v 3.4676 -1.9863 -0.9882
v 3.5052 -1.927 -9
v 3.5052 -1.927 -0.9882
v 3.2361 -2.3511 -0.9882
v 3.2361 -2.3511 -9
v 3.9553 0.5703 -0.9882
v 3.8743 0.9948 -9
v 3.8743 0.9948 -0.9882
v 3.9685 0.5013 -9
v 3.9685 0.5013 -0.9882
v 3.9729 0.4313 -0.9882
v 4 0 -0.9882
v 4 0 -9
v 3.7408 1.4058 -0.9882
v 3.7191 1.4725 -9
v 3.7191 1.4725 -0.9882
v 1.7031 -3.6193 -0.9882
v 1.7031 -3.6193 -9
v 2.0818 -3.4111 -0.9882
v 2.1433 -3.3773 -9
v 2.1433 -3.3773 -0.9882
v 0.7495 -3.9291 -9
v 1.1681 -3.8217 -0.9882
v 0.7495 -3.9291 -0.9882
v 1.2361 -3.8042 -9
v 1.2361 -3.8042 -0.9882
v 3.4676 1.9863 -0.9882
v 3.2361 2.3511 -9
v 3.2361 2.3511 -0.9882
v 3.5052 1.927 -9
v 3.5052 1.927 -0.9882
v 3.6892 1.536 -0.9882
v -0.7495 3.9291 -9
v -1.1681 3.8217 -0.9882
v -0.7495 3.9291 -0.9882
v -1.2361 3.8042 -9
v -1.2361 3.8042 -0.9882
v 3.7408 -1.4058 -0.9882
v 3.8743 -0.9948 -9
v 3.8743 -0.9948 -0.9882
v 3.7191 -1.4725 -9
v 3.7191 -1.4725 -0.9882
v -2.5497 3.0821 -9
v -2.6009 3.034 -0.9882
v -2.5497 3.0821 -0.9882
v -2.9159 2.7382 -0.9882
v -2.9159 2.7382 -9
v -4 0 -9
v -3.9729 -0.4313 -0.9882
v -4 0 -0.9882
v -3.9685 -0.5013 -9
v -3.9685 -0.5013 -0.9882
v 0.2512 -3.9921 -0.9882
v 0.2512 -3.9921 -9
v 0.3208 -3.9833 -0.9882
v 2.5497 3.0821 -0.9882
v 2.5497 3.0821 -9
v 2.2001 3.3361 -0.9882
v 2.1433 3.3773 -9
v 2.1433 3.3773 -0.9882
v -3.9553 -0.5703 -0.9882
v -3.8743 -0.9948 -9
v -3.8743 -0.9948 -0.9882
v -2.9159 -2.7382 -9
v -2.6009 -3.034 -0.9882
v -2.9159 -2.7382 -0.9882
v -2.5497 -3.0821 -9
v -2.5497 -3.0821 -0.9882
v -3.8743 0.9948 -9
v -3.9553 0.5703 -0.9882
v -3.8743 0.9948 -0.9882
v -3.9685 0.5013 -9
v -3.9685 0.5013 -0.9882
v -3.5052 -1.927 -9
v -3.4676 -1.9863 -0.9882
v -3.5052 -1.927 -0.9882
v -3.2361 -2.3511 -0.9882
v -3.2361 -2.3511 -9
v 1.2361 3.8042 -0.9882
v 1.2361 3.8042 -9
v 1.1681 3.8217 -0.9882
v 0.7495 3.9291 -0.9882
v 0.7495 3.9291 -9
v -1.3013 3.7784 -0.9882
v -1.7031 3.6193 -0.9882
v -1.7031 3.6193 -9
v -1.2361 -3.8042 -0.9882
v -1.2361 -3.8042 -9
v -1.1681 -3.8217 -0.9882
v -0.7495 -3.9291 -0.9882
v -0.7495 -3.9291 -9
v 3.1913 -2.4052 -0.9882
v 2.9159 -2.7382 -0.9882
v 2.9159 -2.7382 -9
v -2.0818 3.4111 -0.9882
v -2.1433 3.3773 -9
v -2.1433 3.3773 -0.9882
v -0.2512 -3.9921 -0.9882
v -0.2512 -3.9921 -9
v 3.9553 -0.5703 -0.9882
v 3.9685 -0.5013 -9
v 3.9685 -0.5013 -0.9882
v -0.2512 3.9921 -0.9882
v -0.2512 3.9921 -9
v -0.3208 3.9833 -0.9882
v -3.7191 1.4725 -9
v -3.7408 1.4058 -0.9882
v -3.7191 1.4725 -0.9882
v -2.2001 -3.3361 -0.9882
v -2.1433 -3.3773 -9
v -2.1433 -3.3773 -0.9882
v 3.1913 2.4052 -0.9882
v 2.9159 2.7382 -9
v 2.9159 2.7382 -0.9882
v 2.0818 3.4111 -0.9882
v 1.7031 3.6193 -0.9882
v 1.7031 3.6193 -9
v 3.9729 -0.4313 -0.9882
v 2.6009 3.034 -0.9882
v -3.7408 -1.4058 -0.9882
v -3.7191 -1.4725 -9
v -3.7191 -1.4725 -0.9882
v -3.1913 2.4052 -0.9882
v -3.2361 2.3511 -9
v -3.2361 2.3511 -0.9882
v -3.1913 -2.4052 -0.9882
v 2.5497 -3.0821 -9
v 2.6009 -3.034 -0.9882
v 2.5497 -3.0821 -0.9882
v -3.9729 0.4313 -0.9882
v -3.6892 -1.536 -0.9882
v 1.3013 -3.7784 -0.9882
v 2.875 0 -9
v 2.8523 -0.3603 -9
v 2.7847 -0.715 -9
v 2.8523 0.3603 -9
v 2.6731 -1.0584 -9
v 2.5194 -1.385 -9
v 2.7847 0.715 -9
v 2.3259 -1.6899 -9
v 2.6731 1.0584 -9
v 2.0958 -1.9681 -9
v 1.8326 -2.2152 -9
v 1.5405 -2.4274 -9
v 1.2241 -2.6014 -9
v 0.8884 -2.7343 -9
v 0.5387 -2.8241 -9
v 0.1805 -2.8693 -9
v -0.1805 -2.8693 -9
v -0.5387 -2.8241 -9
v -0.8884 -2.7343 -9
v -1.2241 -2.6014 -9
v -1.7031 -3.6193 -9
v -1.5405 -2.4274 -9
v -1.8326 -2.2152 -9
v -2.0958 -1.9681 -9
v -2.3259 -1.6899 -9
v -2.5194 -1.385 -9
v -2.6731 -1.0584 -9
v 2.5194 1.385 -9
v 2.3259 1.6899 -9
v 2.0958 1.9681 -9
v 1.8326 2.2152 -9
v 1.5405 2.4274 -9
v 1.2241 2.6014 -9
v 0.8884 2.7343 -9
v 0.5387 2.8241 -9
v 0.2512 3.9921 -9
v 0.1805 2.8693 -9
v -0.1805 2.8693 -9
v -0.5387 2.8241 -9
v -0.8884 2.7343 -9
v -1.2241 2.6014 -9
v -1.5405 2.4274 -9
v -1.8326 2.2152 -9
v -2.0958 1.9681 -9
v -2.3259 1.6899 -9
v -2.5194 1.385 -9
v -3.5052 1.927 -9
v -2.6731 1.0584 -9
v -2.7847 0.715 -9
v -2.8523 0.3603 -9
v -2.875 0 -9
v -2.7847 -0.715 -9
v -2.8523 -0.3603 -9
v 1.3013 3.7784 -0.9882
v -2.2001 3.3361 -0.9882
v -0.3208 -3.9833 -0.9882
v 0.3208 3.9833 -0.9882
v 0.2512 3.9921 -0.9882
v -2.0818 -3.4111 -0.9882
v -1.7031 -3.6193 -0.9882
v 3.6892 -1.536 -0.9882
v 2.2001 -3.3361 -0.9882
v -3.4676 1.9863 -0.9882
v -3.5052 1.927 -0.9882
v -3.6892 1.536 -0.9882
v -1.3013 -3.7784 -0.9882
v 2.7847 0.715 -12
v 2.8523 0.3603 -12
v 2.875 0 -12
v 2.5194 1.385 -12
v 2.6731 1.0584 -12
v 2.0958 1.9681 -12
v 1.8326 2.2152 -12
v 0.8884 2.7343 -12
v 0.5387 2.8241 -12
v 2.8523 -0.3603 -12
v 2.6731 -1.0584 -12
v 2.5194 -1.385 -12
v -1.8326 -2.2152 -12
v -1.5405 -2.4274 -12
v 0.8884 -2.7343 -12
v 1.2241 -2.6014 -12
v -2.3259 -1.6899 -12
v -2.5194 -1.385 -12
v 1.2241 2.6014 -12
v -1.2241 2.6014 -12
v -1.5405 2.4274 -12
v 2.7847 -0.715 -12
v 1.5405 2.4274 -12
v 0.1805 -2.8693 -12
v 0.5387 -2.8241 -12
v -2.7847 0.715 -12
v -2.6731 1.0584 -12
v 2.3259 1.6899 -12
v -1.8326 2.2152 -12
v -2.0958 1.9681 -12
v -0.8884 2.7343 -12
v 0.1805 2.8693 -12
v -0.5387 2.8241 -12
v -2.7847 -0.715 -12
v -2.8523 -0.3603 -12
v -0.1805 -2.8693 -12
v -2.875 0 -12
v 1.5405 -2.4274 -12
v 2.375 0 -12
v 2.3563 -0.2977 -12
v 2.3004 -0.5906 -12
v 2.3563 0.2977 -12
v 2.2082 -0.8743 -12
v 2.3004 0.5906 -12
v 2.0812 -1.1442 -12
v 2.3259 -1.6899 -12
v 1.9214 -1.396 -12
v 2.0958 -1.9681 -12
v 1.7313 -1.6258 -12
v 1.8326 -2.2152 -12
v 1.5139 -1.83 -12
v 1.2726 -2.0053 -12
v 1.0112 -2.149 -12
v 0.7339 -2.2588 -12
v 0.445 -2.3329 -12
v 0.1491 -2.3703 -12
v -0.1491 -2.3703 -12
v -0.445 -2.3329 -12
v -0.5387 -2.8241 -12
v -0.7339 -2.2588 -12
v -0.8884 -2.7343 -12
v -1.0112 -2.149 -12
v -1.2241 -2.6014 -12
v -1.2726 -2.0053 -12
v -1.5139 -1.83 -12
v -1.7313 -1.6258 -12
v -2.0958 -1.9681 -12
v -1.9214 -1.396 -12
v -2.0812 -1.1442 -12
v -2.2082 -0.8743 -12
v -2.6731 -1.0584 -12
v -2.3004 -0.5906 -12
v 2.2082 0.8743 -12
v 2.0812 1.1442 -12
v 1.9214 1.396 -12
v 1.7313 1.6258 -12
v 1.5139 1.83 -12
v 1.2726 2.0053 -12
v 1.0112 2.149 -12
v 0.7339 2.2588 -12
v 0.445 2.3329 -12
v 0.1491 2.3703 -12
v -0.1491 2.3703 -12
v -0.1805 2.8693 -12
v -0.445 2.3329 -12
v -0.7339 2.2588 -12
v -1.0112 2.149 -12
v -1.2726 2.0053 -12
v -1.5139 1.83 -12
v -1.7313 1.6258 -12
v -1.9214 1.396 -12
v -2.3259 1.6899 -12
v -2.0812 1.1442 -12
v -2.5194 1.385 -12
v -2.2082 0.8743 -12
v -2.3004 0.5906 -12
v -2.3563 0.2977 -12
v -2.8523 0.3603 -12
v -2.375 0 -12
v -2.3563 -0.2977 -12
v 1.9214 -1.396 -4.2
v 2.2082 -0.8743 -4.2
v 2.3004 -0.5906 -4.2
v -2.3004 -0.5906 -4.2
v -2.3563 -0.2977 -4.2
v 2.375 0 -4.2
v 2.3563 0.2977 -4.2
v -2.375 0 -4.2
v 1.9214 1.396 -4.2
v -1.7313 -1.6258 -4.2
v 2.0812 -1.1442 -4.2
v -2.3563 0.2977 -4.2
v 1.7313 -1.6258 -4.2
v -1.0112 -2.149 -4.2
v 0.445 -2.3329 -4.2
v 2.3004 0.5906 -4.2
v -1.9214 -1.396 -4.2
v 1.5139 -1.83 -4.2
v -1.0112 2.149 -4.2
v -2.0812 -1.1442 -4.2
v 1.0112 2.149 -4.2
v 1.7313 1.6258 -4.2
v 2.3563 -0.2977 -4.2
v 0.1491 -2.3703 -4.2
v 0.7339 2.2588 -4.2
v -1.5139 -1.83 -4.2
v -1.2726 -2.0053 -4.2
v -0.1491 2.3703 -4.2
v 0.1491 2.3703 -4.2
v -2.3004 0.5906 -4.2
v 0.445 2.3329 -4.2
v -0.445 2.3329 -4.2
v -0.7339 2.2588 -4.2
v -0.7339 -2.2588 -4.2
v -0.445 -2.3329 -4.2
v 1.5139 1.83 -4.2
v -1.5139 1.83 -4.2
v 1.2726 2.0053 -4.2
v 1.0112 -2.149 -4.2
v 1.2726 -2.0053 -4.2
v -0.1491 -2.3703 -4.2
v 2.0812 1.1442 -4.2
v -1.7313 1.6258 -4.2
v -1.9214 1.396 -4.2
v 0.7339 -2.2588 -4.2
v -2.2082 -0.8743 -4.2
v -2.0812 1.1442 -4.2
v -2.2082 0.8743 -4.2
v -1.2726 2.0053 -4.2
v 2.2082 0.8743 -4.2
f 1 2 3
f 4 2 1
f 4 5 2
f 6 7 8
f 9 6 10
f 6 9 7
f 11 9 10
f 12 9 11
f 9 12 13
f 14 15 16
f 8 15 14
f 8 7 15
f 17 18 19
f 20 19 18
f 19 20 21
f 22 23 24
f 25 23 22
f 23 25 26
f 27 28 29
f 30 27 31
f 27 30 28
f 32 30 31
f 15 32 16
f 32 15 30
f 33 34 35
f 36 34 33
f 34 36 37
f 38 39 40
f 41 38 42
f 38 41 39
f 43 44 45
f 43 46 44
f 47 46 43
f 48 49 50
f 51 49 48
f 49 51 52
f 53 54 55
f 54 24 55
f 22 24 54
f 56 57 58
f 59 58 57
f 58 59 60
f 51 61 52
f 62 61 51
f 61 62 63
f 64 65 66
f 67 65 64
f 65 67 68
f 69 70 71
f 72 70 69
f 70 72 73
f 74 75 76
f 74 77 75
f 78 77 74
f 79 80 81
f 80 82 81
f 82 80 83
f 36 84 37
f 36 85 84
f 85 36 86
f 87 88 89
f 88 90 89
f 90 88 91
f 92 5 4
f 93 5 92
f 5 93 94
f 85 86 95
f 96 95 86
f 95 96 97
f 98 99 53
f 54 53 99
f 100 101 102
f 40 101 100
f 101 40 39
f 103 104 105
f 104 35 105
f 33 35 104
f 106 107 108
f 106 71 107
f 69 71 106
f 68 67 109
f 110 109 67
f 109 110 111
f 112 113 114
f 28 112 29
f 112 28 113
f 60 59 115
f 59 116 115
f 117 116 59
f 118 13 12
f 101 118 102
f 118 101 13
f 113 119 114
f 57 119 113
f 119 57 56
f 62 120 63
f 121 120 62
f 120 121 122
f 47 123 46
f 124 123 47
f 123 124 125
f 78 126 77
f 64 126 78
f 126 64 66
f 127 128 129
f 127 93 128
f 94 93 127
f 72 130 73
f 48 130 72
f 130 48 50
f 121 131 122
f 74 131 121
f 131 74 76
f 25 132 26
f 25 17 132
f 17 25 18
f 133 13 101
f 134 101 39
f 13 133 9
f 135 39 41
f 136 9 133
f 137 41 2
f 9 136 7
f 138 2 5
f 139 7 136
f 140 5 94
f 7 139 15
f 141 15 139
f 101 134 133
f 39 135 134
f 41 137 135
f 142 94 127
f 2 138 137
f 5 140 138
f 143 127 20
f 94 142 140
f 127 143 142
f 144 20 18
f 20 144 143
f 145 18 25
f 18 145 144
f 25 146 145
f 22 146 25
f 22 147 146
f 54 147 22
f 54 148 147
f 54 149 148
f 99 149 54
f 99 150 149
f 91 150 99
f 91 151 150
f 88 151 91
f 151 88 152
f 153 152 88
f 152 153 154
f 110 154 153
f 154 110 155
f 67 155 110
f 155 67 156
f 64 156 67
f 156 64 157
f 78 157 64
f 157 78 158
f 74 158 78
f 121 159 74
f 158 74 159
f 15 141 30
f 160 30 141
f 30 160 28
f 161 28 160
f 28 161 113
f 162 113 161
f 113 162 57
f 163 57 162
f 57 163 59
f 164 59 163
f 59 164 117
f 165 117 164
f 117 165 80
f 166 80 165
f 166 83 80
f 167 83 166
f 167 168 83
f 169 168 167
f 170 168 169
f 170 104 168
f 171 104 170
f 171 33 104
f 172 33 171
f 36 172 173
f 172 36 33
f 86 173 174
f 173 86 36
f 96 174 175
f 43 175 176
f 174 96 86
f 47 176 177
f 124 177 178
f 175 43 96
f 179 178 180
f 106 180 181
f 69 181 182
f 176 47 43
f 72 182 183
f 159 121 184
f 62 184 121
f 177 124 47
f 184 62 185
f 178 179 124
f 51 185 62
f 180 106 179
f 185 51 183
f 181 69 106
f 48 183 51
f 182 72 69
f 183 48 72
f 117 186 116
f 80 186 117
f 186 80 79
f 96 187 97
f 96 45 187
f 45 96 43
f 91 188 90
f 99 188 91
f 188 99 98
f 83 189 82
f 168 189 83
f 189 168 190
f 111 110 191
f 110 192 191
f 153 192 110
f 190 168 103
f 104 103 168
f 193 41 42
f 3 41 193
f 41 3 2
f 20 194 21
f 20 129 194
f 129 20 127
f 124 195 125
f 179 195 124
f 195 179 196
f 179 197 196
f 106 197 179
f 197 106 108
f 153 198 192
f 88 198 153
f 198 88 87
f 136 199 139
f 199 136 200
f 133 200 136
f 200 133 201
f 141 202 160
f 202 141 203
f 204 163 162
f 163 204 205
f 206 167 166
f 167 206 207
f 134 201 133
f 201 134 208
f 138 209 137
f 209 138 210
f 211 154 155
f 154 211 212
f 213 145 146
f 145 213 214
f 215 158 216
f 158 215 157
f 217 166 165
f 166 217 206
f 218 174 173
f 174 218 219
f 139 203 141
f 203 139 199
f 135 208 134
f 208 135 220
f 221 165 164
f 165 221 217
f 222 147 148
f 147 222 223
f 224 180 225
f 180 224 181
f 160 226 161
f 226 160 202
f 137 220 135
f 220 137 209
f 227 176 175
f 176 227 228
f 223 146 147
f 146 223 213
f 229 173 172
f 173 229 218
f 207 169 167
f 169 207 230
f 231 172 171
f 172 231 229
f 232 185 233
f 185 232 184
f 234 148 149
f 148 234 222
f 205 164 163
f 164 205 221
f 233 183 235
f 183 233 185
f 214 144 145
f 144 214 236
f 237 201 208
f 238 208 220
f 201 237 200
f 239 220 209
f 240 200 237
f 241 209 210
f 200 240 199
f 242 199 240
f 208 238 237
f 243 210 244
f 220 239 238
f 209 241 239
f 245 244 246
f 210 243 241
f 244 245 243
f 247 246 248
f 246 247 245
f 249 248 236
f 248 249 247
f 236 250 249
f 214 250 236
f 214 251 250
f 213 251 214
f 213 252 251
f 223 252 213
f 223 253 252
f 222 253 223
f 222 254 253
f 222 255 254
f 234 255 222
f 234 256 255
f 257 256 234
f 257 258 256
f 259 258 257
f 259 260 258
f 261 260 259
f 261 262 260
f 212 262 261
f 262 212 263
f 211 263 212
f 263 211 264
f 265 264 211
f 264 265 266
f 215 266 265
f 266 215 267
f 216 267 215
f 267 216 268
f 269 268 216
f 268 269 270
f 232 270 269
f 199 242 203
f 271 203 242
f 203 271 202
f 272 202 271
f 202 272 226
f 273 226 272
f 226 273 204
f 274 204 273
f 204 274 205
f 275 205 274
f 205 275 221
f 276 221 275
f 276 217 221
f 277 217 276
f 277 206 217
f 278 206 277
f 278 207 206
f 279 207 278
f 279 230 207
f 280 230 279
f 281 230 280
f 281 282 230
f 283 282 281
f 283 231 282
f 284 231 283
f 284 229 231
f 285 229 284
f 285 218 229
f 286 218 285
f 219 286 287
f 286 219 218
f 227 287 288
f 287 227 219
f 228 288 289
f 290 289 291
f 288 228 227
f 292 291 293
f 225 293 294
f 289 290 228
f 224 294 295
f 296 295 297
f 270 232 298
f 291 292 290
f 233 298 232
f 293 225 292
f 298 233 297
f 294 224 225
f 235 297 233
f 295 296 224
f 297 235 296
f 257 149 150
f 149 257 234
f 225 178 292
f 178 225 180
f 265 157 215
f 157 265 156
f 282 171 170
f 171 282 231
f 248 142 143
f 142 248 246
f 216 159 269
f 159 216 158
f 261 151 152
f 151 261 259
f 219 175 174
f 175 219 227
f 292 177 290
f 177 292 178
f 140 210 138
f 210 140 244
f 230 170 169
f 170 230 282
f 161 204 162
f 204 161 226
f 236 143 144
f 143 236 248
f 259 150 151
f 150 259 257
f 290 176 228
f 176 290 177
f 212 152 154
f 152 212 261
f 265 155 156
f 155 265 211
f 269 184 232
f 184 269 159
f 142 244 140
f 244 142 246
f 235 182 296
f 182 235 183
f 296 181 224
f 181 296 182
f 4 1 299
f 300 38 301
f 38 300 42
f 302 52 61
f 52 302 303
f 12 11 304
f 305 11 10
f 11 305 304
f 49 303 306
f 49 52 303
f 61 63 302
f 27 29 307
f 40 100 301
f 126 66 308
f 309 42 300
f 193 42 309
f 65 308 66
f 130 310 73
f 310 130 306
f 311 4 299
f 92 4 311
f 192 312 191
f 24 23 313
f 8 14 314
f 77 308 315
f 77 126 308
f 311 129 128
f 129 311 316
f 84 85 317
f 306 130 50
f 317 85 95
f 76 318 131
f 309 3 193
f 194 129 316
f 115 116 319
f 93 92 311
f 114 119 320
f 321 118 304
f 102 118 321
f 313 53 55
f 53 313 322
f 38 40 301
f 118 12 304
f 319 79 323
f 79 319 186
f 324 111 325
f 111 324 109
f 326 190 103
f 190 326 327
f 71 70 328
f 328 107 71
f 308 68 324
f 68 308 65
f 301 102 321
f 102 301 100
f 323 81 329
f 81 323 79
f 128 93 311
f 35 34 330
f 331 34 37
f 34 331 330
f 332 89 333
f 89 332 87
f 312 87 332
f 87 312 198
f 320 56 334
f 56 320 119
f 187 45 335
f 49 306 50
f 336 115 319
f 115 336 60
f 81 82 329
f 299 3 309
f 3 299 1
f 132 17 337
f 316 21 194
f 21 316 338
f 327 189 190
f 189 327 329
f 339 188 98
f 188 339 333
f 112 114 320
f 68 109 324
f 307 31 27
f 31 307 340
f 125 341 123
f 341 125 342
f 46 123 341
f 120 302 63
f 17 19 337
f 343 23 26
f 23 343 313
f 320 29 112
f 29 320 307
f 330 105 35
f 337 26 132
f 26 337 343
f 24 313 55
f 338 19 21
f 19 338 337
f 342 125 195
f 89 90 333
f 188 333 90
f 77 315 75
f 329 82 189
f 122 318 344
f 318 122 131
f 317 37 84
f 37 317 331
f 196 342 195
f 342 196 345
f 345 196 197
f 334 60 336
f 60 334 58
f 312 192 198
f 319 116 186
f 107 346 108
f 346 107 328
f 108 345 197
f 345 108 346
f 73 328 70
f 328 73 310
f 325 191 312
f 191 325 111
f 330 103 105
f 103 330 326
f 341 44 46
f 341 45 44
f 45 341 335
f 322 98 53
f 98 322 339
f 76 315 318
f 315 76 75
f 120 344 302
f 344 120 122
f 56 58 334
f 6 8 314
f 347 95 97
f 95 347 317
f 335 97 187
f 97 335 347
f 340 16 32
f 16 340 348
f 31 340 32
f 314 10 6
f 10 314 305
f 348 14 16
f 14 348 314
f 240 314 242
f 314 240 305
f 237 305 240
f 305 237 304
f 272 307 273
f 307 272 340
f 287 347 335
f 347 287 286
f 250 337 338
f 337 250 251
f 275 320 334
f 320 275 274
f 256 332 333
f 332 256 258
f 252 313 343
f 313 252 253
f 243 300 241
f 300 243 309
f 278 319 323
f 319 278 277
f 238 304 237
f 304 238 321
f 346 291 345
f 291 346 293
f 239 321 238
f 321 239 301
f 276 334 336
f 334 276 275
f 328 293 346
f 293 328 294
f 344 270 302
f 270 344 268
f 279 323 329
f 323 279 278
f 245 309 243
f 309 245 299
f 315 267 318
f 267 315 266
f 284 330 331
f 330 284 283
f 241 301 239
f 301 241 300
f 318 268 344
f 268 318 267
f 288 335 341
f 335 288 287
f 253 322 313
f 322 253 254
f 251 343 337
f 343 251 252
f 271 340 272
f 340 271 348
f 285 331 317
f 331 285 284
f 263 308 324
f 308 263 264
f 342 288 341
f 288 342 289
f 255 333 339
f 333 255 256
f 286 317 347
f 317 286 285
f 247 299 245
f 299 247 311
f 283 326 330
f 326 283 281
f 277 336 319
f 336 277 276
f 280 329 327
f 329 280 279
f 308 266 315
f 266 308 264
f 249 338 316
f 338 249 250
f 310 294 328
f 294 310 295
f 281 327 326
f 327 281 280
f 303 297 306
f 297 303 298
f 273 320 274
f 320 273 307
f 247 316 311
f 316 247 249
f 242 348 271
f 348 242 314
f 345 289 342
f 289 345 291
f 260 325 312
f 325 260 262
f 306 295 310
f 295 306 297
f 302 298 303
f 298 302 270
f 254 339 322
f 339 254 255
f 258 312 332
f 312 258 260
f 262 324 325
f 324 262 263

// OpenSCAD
$fn = 50;

difference() {
	union() {
		translate(v = [0, 0, -9.0]) {
			cylinder(h = 12, r = 4.0);
		}
		#translate(v = [0, 0, -12.0]) {
			cylinder(h = 12, r = 2.875);
		}
	}
	union() {
		translate(v = [0, 0, 0]) {
			rotate(a = [0, 0, 0]) {
				difference() {
					union() {
						translate(v = [0, 0, -12.0]) {
							cylinder(h = 12, r = 2.25);
						}
						translate(v = [0, 0, -4.2]) {
							cylinder(h = 4.2, r1 = 2.375, r2 = 4.5);
						}
						translate(v = [0, 0, -12.0]) {
							cylinder(h = 12, r = 2.375);
						}
						translate(v = [0, 0, -12.0]) {
							cylinder(h = 12, r = 2.25);
						}
					}
					union();
				}
			}
		}
		#cylinder(h = 3, r = 5.0);
	}
}
